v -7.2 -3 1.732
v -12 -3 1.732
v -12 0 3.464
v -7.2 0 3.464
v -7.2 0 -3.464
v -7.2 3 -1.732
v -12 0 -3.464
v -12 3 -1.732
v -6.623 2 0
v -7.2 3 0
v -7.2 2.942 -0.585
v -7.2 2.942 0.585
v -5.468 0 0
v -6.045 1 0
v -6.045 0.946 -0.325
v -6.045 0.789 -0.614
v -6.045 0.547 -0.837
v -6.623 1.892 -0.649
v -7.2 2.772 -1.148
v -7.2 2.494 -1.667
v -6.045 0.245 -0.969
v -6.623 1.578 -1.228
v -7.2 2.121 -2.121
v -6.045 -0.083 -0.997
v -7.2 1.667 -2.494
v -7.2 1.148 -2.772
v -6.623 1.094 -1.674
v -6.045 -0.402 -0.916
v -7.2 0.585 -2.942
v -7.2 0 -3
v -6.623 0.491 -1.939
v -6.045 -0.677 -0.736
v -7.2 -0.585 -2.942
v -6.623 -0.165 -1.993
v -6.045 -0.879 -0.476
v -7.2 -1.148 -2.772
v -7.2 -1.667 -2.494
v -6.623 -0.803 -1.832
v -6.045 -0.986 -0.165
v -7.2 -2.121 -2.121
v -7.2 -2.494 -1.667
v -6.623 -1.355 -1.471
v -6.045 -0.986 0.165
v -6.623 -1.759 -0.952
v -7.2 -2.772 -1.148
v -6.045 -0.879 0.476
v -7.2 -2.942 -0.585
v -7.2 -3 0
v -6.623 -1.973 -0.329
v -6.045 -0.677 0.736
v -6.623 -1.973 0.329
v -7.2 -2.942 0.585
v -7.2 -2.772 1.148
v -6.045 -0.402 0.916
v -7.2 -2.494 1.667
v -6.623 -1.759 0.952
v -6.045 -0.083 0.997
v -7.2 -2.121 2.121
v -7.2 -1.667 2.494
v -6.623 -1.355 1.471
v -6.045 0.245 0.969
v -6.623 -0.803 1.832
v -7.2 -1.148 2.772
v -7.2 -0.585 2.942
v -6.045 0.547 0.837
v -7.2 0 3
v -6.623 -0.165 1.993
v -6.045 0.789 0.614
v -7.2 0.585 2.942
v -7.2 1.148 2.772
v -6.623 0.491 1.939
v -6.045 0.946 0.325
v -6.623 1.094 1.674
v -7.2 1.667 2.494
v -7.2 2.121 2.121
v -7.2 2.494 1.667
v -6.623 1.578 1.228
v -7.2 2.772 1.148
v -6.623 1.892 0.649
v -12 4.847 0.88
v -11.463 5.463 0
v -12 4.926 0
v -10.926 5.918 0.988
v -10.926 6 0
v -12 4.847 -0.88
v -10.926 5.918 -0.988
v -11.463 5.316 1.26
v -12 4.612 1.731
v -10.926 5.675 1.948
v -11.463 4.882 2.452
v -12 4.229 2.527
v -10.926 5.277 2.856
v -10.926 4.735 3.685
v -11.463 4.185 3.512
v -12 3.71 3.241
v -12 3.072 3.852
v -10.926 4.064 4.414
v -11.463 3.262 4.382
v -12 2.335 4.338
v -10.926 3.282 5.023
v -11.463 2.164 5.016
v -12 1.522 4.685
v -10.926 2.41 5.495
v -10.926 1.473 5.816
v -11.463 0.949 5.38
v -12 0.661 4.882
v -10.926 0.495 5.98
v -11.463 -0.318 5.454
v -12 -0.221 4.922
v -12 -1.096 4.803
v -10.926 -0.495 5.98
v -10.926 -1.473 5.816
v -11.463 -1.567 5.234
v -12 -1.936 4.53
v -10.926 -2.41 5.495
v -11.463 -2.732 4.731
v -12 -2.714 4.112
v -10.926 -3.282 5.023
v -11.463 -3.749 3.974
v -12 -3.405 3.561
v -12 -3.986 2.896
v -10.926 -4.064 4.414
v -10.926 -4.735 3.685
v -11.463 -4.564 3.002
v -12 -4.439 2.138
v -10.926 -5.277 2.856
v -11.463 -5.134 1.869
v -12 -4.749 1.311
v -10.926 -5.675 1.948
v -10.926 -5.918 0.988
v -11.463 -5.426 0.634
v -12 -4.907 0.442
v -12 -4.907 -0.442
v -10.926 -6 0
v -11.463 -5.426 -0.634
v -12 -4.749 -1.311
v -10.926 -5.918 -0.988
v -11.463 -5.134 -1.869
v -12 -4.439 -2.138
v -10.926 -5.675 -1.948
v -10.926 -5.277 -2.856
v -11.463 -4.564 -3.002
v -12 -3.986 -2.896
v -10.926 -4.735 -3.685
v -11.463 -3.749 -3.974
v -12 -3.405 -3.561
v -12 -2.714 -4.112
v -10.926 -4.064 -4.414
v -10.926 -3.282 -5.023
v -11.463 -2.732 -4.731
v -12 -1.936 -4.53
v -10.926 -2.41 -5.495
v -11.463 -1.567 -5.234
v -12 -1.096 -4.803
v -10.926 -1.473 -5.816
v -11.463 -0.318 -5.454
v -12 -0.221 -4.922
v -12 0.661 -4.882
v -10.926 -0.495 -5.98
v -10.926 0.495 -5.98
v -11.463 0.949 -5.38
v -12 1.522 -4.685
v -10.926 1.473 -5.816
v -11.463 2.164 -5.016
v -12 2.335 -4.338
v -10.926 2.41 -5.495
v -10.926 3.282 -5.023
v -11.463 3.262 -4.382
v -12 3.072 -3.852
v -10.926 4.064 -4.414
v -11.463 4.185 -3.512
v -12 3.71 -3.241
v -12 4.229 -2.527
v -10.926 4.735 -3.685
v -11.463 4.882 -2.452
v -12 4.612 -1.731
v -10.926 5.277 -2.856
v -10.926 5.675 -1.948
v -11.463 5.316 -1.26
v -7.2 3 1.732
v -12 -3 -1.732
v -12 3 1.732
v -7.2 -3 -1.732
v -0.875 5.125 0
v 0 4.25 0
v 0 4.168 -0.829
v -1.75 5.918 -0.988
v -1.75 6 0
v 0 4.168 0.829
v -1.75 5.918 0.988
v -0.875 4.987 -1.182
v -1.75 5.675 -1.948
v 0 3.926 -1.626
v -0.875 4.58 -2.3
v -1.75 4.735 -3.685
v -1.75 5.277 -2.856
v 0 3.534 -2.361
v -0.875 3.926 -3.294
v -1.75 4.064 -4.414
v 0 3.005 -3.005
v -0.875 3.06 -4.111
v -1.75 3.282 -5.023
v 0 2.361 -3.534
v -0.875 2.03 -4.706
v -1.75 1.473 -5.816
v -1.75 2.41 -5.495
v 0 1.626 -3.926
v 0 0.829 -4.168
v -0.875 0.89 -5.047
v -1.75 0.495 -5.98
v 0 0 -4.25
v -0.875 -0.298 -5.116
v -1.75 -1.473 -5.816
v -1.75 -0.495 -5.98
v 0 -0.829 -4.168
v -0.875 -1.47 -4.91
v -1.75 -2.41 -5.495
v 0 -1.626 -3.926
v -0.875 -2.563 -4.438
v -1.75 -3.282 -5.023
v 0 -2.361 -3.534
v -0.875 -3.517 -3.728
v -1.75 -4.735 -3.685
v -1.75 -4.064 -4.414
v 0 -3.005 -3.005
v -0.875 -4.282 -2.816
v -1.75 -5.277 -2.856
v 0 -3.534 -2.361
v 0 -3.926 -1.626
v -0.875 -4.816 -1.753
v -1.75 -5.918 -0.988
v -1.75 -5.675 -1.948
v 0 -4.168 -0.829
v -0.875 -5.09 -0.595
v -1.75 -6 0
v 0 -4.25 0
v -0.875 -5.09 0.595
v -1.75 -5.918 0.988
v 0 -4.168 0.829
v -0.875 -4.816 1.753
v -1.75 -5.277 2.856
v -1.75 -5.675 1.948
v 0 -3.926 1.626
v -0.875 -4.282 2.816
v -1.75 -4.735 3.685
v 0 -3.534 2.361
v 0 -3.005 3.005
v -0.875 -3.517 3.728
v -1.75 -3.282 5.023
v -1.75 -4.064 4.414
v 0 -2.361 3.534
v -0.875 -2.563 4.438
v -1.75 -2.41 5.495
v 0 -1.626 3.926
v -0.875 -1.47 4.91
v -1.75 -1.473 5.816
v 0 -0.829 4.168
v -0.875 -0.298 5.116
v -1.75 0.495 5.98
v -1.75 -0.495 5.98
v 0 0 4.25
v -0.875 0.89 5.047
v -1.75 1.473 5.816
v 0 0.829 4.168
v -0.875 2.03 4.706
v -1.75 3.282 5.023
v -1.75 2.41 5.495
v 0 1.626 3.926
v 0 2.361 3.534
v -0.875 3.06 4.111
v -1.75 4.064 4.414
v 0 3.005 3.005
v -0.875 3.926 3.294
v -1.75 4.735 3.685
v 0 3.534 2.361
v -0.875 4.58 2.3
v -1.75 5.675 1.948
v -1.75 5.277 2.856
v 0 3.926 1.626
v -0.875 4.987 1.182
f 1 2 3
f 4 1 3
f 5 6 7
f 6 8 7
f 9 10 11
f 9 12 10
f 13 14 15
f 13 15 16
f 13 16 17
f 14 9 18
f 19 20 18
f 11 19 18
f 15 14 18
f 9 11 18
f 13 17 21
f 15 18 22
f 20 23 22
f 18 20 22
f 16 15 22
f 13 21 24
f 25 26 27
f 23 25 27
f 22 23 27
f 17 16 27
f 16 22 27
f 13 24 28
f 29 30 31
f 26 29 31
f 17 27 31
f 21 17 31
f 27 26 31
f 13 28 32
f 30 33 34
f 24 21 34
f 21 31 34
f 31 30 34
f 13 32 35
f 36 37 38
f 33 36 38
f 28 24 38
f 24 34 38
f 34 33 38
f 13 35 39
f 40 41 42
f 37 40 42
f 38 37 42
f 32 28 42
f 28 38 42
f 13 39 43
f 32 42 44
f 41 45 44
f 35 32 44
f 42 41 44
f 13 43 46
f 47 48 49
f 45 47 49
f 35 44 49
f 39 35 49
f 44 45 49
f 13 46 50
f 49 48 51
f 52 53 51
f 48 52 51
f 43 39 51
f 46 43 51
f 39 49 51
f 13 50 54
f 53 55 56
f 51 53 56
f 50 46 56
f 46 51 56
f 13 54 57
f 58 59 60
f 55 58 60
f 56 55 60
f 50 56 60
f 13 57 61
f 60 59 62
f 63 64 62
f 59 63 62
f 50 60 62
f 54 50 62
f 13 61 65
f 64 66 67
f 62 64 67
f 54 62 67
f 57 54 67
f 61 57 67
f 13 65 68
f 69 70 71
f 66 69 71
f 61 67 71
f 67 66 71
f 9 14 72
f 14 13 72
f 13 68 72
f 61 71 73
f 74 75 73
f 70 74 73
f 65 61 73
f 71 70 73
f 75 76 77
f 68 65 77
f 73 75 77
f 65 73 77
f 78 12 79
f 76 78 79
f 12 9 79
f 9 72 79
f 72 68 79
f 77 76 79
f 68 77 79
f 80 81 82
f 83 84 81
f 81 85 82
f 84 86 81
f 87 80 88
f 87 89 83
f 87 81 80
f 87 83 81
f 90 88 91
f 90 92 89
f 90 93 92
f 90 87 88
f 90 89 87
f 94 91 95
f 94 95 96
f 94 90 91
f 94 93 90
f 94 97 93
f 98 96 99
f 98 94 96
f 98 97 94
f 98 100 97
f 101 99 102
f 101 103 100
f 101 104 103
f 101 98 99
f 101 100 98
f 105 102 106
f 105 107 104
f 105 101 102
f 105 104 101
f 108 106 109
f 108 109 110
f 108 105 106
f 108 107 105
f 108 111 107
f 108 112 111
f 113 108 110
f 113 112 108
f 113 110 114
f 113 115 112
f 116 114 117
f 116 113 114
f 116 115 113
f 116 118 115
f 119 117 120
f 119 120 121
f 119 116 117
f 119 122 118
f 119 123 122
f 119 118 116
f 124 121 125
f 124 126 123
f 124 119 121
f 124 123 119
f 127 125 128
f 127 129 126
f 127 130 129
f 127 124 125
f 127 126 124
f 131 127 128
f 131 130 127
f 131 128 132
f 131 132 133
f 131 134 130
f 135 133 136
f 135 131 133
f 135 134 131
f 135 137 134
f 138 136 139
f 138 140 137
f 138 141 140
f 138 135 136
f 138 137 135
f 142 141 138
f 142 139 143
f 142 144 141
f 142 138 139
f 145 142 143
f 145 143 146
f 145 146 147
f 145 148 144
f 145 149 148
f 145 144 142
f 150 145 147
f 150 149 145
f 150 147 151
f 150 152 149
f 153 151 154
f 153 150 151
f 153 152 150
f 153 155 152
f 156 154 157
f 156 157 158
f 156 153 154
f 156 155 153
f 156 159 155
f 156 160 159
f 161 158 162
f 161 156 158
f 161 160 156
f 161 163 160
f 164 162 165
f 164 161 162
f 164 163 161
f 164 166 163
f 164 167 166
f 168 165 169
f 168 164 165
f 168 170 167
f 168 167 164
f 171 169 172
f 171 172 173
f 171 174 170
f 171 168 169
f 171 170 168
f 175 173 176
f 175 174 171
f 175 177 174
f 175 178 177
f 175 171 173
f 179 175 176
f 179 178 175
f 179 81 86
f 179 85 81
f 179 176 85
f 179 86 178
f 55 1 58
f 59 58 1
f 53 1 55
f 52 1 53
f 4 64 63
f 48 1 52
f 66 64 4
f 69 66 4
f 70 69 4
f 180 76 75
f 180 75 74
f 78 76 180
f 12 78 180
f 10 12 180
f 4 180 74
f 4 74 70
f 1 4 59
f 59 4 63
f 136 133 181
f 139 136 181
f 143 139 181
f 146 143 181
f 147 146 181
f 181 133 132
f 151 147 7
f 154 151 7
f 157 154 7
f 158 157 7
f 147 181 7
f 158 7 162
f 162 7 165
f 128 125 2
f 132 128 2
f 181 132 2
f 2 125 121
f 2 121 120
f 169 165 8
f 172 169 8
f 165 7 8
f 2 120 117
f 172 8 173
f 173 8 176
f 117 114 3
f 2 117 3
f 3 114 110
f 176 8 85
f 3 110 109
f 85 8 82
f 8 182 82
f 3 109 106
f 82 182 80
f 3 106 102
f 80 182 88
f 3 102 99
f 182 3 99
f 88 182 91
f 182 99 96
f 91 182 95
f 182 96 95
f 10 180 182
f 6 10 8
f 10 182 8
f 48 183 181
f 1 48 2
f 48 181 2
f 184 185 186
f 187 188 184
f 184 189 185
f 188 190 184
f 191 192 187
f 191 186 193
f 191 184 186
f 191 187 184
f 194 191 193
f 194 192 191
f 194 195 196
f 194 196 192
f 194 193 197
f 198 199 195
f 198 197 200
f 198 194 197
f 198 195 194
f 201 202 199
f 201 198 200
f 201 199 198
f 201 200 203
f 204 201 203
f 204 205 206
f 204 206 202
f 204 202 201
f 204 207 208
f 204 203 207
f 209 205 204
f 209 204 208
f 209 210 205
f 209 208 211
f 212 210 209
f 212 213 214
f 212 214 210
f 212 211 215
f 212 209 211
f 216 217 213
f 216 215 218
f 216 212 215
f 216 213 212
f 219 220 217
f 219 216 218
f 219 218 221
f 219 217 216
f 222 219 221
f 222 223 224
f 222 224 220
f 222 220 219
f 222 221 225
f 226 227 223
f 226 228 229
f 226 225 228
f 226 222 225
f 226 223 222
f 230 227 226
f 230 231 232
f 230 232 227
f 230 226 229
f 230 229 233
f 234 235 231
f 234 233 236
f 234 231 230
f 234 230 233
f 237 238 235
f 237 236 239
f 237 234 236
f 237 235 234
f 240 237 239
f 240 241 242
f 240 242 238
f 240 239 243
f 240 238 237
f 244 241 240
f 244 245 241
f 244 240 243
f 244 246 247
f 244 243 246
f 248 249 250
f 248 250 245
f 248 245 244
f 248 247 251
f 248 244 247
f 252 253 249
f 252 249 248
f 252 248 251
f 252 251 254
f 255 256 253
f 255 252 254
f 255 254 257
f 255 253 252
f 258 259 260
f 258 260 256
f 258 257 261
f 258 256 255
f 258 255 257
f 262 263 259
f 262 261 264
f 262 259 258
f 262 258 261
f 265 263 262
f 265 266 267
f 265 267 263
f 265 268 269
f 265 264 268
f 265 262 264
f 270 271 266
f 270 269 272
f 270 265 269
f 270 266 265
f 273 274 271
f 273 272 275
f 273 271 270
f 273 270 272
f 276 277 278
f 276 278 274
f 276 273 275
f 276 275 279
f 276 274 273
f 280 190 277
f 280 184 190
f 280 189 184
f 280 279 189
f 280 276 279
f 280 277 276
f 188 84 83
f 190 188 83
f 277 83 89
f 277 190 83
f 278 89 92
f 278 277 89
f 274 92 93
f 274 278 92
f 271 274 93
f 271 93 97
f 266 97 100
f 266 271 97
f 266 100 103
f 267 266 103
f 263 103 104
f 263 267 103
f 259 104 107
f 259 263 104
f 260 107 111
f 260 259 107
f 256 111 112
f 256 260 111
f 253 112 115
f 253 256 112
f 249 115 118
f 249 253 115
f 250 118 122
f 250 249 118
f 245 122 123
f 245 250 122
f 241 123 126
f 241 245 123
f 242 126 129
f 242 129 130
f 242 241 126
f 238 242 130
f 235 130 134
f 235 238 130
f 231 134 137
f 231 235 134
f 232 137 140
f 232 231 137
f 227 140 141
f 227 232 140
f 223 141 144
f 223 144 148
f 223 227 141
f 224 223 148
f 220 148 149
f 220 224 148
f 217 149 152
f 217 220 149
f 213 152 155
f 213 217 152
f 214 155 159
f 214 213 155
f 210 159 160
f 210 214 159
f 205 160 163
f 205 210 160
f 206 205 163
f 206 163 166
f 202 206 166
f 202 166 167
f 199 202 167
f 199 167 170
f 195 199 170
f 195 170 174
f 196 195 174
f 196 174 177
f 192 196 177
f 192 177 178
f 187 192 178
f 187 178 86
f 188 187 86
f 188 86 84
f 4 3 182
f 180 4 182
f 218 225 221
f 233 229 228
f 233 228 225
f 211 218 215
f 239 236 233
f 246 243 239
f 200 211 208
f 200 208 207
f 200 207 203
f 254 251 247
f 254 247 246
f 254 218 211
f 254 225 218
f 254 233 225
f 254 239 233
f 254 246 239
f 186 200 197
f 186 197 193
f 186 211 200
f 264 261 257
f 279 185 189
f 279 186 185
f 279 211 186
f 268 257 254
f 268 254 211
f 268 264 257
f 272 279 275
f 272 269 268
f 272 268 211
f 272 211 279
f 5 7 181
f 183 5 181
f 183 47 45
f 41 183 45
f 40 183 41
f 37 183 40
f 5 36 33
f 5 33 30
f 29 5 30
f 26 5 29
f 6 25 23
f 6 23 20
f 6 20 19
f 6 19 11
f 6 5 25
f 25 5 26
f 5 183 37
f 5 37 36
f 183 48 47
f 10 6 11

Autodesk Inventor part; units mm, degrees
sketch "Sketch_1" plane through (0, 0, 0) normal (0, 0, 1) x (1, 0, 0)
  line L0 (0, 0) -> (-12, 0)
  line L1 (-12, 0) -> (-12, 4.9265)
  line L2 (-12, 4.9265) -> (-10.9265, 6)
  line L3 (-10.9265, 6) -> (-1.75, 6)
  line L4 (-1.75, 6) -> (0, 4.25)
  line L5 (0, 4.25) -> (0, 0)
  line L6 (0, 0) -> (-12, 0)
revolve "Revolution1" add sketch "Sketch_1" angle 360 about axis through (0, 0, 0) along (1, 0, 0)
thread "Thread1" size "M12x1.75" class "6g" standard "ISO Metric profile" full length
sketch "Sketch_2" plane through (-12, 0, 0) normal (-1, 0, 0) x (0, 1, 0)
  line L0 (-3, -1.7321) -> (0, -3.4641)
  line L1 (0, -3.4641) -> (3, -1.7321)
  line L2 (3, -1.7321) -> (3, 1.7321)
  line L3 (3, 1.7321) -> (0, 3.4641)
  line L4 (0, 3.4641) -> (-3, 1.7321)
  line L5 (-3, 1.7321) -> (-3, -1.7321)
extrude "Extrusion1" cut sketch "Sketch_2" against normal blind 4.8
sketch "Sketch_3" plane through (0, 0, 0) normal (0, 0, 1) x (1, 0, 0)
  line L0 (-5.4679, 0) -> (-7.2, 0)
  line L1 (-7.2, 0) -> (-7.2, 3)
  line L2 (-7.2, 3) -> (-5.4679, 0)
  line L3 (-5.4679, 0) -> (-7.2, 0)
revolve "Revolution2" cut sketch "Sketch_3" angle 360 about axis through (-5.4679, 0, 0) along (1, 0, 0)
ref_plane "CP_XY" through (0, 0, 0) normal (1, 0, 0) x (0, 0, -1)
ref_plane "CP_YZ" through (0, 0, 0) normal (0, 0, -1) x (0, 1, 0)
ref_plane "CP_ZX" through (0, 0, 0) normal (0, 1, 0) x (1, 0, 0)
properties part number "SET-SCREW12-12"
